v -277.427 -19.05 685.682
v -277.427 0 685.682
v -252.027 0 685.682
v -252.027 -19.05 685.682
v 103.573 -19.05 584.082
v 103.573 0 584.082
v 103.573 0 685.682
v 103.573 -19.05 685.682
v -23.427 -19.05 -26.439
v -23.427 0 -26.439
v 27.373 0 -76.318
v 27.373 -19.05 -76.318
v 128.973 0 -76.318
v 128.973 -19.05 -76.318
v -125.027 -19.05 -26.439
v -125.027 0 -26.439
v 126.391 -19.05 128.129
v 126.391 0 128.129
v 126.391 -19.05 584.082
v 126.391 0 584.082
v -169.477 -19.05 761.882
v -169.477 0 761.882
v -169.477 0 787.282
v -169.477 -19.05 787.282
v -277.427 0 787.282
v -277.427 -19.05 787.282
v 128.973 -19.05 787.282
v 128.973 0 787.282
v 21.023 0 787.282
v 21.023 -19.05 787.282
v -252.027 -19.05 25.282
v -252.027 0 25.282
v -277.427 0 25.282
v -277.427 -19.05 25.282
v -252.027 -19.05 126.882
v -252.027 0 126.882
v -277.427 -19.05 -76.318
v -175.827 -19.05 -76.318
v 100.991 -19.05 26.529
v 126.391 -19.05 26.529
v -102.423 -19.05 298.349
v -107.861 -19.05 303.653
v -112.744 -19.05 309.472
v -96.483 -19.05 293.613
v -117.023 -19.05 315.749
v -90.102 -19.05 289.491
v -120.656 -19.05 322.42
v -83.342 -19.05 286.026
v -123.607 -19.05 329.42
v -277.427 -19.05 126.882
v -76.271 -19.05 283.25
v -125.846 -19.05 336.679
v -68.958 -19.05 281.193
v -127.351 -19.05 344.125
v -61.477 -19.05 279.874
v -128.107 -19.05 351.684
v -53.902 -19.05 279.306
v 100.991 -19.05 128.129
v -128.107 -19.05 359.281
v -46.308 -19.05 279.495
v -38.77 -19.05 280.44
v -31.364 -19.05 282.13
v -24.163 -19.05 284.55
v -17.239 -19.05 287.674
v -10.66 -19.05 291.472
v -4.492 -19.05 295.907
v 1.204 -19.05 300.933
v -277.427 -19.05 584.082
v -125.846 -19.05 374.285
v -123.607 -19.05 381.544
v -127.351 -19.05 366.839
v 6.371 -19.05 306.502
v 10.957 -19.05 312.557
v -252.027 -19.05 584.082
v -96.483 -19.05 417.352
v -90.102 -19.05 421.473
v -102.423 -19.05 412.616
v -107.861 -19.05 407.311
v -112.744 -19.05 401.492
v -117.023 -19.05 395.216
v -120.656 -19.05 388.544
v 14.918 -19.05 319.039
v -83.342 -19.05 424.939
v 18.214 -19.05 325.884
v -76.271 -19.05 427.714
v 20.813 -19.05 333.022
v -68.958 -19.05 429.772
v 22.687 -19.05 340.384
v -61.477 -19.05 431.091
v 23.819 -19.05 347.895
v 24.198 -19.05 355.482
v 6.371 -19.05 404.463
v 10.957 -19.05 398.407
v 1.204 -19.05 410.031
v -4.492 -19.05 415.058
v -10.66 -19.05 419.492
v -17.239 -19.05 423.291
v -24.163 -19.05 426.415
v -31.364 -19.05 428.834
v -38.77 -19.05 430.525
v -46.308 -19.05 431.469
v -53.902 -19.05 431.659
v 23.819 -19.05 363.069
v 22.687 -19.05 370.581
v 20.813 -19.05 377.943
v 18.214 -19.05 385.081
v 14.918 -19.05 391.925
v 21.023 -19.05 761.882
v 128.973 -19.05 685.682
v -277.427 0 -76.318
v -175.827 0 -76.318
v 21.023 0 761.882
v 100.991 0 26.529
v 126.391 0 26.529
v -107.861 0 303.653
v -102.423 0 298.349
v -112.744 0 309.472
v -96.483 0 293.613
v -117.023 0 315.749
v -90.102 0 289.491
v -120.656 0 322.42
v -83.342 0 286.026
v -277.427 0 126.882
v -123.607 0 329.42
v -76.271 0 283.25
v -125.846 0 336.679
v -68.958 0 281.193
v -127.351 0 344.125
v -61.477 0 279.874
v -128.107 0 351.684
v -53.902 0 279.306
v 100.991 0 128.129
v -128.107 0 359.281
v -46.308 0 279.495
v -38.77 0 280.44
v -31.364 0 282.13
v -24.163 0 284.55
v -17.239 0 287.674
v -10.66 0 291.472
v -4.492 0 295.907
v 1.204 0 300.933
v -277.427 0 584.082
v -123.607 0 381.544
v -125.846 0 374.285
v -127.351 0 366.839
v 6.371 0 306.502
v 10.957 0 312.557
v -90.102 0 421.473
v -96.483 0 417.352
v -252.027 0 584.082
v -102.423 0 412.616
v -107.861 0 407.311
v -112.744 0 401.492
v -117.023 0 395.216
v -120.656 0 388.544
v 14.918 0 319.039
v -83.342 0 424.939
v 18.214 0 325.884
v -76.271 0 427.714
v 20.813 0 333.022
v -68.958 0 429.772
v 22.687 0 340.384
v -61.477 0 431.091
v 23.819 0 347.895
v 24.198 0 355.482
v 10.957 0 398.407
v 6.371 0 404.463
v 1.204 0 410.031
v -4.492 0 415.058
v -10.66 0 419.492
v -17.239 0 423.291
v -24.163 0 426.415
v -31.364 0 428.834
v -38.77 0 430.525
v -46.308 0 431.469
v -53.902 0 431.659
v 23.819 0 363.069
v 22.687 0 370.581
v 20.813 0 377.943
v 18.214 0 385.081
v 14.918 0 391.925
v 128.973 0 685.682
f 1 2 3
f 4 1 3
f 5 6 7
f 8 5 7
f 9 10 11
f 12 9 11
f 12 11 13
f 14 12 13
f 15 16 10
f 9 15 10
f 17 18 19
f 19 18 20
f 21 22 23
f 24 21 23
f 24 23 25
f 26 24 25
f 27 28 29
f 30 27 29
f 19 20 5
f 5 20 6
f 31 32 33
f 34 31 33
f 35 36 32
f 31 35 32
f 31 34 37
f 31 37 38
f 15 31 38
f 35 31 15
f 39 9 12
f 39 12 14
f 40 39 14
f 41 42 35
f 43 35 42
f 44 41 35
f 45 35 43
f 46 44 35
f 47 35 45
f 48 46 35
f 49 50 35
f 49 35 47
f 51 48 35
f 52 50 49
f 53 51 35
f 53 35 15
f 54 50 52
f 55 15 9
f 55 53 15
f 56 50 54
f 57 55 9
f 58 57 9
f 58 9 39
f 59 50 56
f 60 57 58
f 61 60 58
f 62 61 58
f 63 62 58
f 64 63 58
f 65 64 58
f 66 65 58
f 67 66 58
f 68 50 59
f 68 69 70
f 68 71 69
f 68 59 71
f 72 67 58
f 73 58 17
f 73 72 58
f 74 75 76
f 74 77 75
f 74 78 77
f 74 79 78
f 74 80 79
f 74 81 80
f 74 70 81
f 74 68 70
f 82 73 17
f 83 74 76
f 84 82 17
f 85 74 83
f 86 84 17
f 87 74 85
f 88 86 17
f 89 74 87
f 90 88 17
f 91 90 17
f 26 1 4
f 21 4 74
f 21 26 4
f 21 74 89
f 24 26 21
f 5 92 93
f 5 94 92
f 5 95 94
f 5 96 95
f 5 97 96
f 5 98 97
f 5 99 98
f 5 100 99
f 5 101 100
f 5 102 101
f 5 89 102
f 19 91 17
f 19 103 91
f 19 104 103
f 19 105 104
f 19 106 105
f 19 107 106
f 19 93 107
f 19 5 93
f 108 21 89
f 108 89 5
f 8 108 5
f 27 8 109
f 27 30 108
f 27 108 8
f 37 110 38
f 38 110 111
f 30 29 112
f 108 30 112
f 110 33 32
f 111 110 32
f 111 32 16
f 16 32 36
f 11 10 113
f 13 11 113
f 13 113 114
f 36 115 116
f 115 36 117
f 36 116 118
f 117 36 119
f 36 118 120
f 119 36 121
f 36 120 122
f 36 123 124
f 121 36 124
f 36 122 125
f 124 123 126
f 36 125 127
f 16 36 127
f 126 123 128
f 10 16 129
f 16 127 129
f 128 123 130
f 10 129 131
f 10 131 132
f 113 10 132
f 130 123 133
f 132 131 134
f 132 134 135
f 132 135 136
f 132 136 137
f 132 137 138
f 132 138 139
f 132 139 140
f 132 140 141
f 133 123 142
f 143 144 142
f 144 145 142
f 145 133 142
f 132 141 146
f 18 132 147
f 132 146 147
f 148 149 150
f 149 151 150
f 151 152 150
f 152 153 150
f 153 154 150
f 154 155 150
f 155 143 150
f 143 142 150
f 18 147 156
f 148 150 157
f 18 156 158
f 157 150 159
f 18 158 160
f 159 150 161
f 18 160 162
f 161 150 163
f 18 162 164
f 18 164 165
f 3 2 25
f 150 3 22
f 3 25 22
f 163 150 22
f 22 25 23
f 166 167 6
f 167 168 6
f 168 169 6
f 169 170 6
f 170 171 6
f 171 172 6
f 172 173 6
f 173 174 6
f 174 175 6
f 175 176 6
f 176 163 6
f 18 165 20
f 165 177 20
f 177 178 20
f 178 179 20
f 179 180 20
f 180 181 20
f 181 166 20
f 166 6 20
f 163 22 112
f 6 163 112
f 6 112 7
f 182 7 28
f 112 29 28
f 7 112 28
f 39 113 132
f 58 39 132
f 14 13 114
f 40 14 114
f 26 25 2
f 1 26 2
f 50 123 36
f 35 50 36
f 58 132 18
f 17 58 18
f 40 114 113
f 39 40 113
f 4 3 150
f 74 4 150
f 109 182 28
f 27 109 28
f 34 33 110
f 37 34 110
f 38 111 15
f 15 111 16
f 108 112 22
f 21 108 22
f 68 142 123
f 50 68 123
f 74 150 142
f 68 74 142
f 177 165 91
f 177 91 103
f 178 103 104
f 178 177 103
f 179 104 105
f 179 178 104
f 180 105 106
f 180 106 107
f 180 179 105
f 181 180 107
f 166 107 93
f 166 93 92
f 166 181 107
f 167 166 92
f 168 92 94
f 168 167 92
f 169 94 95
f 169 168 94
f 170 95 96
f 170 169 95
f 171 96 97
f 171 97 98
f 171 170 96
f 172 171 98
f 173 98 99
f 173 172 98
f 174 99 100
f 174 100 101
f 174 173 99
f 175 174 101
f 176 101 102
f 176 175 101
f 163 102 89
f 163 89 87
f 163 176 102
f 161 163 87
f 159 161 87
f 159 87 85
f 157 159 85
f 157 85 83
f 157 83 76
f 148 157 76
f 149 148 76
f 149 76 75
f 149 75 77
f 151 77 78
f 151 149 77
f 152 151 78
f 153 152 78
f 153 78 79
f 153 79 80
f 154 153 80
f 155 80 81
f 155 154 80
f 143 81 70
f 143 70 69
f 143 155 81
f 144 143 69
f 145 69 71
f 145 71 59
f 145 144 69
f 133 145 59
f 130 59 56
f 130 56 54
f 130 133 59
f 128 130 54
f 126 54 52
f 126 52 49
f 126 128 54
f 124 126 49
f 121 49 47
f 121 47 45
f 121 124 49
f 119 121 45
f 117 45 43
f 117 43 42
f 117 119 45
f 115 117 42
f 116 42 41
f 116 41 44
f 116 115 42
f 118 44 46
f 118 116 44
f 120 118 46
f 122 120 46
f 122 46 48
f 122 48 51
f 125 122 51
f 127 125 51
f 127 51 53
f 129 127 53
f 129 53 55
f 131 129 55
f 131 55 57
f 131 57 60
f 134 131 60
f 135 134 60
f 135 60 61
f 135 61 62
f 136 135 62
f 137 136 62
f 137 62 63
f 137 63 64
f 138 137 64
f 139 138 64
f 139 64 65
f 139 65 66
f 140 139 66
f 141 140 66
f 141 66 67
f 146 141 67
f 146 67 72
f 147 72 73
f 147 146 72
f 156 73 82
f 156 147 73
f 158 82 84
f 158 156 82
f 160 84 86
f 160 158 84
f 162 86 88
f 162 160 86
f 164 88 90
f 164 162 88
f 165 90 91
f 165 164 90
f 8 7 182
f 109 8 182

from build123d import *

# Parameters (mm, degrees)
F0_R     = 76.2
F1_DEPTH = 19.05


# Not quite as in the source:
# - a length typed as a fraction of an inch, garbled in the dataset ("3 / 203.2 mm" for 3/8 in), is restored
# - a feature names something its author has since deleted; it is built from what else it names


with BuildPart() as f1:
    # F0 (on Front) → F1 (new body)
    with BuildSketch(Plane.XZ):
        Polygon((-277.4270822048, 25.2823245883), (-277.4270822048, -76.3176754117), (-175.8270822048, -76.3176754117), (-125.0270822048, -26.4387615025), (-23.4270822048, -26.4387615025), (27.3729177952, -76.3176754117), (128.9729177952, -76.3176754117), (126.3909138083, 26.5286043286), (100.9909138083, 26.5286043286), (100.9909138083, 128.1286043286), (126.3909138083, 128.1286043286), (126.3909138083, 584.0823245883), (103.5729177952, 584.0823245883), (103.5729177952, 685.6823245883), (128.9729177952, 685.6823245883), (128.9729177952, 787.2823245883), (21.0229177952, 787.2823245883), (21.0229177952, 761.8823245883), (-169.4770822048, 761.8823245883), (-169.4770822048, 787.2823245883), (-277.4270822048, 787.2823245883), (-277.4270822048, 685.6823245883), (-252.0270822048, 685.6823245883), (-252.0270822048, 584.0823245883), (-277.4270822048, 584.0823245883), (-277.4270822048, 126.8823245883), (-252.0270822048, 126.8823245883), (-252.0270822048, 25.2823245883), align=None)
        with Locations((-52.0020822048, 355.4823245883)):
            Circle(F0_R, mode=Mode.SUBTRACT)
    extrude(amount=F1_DEPTH)


solid = f1.part
